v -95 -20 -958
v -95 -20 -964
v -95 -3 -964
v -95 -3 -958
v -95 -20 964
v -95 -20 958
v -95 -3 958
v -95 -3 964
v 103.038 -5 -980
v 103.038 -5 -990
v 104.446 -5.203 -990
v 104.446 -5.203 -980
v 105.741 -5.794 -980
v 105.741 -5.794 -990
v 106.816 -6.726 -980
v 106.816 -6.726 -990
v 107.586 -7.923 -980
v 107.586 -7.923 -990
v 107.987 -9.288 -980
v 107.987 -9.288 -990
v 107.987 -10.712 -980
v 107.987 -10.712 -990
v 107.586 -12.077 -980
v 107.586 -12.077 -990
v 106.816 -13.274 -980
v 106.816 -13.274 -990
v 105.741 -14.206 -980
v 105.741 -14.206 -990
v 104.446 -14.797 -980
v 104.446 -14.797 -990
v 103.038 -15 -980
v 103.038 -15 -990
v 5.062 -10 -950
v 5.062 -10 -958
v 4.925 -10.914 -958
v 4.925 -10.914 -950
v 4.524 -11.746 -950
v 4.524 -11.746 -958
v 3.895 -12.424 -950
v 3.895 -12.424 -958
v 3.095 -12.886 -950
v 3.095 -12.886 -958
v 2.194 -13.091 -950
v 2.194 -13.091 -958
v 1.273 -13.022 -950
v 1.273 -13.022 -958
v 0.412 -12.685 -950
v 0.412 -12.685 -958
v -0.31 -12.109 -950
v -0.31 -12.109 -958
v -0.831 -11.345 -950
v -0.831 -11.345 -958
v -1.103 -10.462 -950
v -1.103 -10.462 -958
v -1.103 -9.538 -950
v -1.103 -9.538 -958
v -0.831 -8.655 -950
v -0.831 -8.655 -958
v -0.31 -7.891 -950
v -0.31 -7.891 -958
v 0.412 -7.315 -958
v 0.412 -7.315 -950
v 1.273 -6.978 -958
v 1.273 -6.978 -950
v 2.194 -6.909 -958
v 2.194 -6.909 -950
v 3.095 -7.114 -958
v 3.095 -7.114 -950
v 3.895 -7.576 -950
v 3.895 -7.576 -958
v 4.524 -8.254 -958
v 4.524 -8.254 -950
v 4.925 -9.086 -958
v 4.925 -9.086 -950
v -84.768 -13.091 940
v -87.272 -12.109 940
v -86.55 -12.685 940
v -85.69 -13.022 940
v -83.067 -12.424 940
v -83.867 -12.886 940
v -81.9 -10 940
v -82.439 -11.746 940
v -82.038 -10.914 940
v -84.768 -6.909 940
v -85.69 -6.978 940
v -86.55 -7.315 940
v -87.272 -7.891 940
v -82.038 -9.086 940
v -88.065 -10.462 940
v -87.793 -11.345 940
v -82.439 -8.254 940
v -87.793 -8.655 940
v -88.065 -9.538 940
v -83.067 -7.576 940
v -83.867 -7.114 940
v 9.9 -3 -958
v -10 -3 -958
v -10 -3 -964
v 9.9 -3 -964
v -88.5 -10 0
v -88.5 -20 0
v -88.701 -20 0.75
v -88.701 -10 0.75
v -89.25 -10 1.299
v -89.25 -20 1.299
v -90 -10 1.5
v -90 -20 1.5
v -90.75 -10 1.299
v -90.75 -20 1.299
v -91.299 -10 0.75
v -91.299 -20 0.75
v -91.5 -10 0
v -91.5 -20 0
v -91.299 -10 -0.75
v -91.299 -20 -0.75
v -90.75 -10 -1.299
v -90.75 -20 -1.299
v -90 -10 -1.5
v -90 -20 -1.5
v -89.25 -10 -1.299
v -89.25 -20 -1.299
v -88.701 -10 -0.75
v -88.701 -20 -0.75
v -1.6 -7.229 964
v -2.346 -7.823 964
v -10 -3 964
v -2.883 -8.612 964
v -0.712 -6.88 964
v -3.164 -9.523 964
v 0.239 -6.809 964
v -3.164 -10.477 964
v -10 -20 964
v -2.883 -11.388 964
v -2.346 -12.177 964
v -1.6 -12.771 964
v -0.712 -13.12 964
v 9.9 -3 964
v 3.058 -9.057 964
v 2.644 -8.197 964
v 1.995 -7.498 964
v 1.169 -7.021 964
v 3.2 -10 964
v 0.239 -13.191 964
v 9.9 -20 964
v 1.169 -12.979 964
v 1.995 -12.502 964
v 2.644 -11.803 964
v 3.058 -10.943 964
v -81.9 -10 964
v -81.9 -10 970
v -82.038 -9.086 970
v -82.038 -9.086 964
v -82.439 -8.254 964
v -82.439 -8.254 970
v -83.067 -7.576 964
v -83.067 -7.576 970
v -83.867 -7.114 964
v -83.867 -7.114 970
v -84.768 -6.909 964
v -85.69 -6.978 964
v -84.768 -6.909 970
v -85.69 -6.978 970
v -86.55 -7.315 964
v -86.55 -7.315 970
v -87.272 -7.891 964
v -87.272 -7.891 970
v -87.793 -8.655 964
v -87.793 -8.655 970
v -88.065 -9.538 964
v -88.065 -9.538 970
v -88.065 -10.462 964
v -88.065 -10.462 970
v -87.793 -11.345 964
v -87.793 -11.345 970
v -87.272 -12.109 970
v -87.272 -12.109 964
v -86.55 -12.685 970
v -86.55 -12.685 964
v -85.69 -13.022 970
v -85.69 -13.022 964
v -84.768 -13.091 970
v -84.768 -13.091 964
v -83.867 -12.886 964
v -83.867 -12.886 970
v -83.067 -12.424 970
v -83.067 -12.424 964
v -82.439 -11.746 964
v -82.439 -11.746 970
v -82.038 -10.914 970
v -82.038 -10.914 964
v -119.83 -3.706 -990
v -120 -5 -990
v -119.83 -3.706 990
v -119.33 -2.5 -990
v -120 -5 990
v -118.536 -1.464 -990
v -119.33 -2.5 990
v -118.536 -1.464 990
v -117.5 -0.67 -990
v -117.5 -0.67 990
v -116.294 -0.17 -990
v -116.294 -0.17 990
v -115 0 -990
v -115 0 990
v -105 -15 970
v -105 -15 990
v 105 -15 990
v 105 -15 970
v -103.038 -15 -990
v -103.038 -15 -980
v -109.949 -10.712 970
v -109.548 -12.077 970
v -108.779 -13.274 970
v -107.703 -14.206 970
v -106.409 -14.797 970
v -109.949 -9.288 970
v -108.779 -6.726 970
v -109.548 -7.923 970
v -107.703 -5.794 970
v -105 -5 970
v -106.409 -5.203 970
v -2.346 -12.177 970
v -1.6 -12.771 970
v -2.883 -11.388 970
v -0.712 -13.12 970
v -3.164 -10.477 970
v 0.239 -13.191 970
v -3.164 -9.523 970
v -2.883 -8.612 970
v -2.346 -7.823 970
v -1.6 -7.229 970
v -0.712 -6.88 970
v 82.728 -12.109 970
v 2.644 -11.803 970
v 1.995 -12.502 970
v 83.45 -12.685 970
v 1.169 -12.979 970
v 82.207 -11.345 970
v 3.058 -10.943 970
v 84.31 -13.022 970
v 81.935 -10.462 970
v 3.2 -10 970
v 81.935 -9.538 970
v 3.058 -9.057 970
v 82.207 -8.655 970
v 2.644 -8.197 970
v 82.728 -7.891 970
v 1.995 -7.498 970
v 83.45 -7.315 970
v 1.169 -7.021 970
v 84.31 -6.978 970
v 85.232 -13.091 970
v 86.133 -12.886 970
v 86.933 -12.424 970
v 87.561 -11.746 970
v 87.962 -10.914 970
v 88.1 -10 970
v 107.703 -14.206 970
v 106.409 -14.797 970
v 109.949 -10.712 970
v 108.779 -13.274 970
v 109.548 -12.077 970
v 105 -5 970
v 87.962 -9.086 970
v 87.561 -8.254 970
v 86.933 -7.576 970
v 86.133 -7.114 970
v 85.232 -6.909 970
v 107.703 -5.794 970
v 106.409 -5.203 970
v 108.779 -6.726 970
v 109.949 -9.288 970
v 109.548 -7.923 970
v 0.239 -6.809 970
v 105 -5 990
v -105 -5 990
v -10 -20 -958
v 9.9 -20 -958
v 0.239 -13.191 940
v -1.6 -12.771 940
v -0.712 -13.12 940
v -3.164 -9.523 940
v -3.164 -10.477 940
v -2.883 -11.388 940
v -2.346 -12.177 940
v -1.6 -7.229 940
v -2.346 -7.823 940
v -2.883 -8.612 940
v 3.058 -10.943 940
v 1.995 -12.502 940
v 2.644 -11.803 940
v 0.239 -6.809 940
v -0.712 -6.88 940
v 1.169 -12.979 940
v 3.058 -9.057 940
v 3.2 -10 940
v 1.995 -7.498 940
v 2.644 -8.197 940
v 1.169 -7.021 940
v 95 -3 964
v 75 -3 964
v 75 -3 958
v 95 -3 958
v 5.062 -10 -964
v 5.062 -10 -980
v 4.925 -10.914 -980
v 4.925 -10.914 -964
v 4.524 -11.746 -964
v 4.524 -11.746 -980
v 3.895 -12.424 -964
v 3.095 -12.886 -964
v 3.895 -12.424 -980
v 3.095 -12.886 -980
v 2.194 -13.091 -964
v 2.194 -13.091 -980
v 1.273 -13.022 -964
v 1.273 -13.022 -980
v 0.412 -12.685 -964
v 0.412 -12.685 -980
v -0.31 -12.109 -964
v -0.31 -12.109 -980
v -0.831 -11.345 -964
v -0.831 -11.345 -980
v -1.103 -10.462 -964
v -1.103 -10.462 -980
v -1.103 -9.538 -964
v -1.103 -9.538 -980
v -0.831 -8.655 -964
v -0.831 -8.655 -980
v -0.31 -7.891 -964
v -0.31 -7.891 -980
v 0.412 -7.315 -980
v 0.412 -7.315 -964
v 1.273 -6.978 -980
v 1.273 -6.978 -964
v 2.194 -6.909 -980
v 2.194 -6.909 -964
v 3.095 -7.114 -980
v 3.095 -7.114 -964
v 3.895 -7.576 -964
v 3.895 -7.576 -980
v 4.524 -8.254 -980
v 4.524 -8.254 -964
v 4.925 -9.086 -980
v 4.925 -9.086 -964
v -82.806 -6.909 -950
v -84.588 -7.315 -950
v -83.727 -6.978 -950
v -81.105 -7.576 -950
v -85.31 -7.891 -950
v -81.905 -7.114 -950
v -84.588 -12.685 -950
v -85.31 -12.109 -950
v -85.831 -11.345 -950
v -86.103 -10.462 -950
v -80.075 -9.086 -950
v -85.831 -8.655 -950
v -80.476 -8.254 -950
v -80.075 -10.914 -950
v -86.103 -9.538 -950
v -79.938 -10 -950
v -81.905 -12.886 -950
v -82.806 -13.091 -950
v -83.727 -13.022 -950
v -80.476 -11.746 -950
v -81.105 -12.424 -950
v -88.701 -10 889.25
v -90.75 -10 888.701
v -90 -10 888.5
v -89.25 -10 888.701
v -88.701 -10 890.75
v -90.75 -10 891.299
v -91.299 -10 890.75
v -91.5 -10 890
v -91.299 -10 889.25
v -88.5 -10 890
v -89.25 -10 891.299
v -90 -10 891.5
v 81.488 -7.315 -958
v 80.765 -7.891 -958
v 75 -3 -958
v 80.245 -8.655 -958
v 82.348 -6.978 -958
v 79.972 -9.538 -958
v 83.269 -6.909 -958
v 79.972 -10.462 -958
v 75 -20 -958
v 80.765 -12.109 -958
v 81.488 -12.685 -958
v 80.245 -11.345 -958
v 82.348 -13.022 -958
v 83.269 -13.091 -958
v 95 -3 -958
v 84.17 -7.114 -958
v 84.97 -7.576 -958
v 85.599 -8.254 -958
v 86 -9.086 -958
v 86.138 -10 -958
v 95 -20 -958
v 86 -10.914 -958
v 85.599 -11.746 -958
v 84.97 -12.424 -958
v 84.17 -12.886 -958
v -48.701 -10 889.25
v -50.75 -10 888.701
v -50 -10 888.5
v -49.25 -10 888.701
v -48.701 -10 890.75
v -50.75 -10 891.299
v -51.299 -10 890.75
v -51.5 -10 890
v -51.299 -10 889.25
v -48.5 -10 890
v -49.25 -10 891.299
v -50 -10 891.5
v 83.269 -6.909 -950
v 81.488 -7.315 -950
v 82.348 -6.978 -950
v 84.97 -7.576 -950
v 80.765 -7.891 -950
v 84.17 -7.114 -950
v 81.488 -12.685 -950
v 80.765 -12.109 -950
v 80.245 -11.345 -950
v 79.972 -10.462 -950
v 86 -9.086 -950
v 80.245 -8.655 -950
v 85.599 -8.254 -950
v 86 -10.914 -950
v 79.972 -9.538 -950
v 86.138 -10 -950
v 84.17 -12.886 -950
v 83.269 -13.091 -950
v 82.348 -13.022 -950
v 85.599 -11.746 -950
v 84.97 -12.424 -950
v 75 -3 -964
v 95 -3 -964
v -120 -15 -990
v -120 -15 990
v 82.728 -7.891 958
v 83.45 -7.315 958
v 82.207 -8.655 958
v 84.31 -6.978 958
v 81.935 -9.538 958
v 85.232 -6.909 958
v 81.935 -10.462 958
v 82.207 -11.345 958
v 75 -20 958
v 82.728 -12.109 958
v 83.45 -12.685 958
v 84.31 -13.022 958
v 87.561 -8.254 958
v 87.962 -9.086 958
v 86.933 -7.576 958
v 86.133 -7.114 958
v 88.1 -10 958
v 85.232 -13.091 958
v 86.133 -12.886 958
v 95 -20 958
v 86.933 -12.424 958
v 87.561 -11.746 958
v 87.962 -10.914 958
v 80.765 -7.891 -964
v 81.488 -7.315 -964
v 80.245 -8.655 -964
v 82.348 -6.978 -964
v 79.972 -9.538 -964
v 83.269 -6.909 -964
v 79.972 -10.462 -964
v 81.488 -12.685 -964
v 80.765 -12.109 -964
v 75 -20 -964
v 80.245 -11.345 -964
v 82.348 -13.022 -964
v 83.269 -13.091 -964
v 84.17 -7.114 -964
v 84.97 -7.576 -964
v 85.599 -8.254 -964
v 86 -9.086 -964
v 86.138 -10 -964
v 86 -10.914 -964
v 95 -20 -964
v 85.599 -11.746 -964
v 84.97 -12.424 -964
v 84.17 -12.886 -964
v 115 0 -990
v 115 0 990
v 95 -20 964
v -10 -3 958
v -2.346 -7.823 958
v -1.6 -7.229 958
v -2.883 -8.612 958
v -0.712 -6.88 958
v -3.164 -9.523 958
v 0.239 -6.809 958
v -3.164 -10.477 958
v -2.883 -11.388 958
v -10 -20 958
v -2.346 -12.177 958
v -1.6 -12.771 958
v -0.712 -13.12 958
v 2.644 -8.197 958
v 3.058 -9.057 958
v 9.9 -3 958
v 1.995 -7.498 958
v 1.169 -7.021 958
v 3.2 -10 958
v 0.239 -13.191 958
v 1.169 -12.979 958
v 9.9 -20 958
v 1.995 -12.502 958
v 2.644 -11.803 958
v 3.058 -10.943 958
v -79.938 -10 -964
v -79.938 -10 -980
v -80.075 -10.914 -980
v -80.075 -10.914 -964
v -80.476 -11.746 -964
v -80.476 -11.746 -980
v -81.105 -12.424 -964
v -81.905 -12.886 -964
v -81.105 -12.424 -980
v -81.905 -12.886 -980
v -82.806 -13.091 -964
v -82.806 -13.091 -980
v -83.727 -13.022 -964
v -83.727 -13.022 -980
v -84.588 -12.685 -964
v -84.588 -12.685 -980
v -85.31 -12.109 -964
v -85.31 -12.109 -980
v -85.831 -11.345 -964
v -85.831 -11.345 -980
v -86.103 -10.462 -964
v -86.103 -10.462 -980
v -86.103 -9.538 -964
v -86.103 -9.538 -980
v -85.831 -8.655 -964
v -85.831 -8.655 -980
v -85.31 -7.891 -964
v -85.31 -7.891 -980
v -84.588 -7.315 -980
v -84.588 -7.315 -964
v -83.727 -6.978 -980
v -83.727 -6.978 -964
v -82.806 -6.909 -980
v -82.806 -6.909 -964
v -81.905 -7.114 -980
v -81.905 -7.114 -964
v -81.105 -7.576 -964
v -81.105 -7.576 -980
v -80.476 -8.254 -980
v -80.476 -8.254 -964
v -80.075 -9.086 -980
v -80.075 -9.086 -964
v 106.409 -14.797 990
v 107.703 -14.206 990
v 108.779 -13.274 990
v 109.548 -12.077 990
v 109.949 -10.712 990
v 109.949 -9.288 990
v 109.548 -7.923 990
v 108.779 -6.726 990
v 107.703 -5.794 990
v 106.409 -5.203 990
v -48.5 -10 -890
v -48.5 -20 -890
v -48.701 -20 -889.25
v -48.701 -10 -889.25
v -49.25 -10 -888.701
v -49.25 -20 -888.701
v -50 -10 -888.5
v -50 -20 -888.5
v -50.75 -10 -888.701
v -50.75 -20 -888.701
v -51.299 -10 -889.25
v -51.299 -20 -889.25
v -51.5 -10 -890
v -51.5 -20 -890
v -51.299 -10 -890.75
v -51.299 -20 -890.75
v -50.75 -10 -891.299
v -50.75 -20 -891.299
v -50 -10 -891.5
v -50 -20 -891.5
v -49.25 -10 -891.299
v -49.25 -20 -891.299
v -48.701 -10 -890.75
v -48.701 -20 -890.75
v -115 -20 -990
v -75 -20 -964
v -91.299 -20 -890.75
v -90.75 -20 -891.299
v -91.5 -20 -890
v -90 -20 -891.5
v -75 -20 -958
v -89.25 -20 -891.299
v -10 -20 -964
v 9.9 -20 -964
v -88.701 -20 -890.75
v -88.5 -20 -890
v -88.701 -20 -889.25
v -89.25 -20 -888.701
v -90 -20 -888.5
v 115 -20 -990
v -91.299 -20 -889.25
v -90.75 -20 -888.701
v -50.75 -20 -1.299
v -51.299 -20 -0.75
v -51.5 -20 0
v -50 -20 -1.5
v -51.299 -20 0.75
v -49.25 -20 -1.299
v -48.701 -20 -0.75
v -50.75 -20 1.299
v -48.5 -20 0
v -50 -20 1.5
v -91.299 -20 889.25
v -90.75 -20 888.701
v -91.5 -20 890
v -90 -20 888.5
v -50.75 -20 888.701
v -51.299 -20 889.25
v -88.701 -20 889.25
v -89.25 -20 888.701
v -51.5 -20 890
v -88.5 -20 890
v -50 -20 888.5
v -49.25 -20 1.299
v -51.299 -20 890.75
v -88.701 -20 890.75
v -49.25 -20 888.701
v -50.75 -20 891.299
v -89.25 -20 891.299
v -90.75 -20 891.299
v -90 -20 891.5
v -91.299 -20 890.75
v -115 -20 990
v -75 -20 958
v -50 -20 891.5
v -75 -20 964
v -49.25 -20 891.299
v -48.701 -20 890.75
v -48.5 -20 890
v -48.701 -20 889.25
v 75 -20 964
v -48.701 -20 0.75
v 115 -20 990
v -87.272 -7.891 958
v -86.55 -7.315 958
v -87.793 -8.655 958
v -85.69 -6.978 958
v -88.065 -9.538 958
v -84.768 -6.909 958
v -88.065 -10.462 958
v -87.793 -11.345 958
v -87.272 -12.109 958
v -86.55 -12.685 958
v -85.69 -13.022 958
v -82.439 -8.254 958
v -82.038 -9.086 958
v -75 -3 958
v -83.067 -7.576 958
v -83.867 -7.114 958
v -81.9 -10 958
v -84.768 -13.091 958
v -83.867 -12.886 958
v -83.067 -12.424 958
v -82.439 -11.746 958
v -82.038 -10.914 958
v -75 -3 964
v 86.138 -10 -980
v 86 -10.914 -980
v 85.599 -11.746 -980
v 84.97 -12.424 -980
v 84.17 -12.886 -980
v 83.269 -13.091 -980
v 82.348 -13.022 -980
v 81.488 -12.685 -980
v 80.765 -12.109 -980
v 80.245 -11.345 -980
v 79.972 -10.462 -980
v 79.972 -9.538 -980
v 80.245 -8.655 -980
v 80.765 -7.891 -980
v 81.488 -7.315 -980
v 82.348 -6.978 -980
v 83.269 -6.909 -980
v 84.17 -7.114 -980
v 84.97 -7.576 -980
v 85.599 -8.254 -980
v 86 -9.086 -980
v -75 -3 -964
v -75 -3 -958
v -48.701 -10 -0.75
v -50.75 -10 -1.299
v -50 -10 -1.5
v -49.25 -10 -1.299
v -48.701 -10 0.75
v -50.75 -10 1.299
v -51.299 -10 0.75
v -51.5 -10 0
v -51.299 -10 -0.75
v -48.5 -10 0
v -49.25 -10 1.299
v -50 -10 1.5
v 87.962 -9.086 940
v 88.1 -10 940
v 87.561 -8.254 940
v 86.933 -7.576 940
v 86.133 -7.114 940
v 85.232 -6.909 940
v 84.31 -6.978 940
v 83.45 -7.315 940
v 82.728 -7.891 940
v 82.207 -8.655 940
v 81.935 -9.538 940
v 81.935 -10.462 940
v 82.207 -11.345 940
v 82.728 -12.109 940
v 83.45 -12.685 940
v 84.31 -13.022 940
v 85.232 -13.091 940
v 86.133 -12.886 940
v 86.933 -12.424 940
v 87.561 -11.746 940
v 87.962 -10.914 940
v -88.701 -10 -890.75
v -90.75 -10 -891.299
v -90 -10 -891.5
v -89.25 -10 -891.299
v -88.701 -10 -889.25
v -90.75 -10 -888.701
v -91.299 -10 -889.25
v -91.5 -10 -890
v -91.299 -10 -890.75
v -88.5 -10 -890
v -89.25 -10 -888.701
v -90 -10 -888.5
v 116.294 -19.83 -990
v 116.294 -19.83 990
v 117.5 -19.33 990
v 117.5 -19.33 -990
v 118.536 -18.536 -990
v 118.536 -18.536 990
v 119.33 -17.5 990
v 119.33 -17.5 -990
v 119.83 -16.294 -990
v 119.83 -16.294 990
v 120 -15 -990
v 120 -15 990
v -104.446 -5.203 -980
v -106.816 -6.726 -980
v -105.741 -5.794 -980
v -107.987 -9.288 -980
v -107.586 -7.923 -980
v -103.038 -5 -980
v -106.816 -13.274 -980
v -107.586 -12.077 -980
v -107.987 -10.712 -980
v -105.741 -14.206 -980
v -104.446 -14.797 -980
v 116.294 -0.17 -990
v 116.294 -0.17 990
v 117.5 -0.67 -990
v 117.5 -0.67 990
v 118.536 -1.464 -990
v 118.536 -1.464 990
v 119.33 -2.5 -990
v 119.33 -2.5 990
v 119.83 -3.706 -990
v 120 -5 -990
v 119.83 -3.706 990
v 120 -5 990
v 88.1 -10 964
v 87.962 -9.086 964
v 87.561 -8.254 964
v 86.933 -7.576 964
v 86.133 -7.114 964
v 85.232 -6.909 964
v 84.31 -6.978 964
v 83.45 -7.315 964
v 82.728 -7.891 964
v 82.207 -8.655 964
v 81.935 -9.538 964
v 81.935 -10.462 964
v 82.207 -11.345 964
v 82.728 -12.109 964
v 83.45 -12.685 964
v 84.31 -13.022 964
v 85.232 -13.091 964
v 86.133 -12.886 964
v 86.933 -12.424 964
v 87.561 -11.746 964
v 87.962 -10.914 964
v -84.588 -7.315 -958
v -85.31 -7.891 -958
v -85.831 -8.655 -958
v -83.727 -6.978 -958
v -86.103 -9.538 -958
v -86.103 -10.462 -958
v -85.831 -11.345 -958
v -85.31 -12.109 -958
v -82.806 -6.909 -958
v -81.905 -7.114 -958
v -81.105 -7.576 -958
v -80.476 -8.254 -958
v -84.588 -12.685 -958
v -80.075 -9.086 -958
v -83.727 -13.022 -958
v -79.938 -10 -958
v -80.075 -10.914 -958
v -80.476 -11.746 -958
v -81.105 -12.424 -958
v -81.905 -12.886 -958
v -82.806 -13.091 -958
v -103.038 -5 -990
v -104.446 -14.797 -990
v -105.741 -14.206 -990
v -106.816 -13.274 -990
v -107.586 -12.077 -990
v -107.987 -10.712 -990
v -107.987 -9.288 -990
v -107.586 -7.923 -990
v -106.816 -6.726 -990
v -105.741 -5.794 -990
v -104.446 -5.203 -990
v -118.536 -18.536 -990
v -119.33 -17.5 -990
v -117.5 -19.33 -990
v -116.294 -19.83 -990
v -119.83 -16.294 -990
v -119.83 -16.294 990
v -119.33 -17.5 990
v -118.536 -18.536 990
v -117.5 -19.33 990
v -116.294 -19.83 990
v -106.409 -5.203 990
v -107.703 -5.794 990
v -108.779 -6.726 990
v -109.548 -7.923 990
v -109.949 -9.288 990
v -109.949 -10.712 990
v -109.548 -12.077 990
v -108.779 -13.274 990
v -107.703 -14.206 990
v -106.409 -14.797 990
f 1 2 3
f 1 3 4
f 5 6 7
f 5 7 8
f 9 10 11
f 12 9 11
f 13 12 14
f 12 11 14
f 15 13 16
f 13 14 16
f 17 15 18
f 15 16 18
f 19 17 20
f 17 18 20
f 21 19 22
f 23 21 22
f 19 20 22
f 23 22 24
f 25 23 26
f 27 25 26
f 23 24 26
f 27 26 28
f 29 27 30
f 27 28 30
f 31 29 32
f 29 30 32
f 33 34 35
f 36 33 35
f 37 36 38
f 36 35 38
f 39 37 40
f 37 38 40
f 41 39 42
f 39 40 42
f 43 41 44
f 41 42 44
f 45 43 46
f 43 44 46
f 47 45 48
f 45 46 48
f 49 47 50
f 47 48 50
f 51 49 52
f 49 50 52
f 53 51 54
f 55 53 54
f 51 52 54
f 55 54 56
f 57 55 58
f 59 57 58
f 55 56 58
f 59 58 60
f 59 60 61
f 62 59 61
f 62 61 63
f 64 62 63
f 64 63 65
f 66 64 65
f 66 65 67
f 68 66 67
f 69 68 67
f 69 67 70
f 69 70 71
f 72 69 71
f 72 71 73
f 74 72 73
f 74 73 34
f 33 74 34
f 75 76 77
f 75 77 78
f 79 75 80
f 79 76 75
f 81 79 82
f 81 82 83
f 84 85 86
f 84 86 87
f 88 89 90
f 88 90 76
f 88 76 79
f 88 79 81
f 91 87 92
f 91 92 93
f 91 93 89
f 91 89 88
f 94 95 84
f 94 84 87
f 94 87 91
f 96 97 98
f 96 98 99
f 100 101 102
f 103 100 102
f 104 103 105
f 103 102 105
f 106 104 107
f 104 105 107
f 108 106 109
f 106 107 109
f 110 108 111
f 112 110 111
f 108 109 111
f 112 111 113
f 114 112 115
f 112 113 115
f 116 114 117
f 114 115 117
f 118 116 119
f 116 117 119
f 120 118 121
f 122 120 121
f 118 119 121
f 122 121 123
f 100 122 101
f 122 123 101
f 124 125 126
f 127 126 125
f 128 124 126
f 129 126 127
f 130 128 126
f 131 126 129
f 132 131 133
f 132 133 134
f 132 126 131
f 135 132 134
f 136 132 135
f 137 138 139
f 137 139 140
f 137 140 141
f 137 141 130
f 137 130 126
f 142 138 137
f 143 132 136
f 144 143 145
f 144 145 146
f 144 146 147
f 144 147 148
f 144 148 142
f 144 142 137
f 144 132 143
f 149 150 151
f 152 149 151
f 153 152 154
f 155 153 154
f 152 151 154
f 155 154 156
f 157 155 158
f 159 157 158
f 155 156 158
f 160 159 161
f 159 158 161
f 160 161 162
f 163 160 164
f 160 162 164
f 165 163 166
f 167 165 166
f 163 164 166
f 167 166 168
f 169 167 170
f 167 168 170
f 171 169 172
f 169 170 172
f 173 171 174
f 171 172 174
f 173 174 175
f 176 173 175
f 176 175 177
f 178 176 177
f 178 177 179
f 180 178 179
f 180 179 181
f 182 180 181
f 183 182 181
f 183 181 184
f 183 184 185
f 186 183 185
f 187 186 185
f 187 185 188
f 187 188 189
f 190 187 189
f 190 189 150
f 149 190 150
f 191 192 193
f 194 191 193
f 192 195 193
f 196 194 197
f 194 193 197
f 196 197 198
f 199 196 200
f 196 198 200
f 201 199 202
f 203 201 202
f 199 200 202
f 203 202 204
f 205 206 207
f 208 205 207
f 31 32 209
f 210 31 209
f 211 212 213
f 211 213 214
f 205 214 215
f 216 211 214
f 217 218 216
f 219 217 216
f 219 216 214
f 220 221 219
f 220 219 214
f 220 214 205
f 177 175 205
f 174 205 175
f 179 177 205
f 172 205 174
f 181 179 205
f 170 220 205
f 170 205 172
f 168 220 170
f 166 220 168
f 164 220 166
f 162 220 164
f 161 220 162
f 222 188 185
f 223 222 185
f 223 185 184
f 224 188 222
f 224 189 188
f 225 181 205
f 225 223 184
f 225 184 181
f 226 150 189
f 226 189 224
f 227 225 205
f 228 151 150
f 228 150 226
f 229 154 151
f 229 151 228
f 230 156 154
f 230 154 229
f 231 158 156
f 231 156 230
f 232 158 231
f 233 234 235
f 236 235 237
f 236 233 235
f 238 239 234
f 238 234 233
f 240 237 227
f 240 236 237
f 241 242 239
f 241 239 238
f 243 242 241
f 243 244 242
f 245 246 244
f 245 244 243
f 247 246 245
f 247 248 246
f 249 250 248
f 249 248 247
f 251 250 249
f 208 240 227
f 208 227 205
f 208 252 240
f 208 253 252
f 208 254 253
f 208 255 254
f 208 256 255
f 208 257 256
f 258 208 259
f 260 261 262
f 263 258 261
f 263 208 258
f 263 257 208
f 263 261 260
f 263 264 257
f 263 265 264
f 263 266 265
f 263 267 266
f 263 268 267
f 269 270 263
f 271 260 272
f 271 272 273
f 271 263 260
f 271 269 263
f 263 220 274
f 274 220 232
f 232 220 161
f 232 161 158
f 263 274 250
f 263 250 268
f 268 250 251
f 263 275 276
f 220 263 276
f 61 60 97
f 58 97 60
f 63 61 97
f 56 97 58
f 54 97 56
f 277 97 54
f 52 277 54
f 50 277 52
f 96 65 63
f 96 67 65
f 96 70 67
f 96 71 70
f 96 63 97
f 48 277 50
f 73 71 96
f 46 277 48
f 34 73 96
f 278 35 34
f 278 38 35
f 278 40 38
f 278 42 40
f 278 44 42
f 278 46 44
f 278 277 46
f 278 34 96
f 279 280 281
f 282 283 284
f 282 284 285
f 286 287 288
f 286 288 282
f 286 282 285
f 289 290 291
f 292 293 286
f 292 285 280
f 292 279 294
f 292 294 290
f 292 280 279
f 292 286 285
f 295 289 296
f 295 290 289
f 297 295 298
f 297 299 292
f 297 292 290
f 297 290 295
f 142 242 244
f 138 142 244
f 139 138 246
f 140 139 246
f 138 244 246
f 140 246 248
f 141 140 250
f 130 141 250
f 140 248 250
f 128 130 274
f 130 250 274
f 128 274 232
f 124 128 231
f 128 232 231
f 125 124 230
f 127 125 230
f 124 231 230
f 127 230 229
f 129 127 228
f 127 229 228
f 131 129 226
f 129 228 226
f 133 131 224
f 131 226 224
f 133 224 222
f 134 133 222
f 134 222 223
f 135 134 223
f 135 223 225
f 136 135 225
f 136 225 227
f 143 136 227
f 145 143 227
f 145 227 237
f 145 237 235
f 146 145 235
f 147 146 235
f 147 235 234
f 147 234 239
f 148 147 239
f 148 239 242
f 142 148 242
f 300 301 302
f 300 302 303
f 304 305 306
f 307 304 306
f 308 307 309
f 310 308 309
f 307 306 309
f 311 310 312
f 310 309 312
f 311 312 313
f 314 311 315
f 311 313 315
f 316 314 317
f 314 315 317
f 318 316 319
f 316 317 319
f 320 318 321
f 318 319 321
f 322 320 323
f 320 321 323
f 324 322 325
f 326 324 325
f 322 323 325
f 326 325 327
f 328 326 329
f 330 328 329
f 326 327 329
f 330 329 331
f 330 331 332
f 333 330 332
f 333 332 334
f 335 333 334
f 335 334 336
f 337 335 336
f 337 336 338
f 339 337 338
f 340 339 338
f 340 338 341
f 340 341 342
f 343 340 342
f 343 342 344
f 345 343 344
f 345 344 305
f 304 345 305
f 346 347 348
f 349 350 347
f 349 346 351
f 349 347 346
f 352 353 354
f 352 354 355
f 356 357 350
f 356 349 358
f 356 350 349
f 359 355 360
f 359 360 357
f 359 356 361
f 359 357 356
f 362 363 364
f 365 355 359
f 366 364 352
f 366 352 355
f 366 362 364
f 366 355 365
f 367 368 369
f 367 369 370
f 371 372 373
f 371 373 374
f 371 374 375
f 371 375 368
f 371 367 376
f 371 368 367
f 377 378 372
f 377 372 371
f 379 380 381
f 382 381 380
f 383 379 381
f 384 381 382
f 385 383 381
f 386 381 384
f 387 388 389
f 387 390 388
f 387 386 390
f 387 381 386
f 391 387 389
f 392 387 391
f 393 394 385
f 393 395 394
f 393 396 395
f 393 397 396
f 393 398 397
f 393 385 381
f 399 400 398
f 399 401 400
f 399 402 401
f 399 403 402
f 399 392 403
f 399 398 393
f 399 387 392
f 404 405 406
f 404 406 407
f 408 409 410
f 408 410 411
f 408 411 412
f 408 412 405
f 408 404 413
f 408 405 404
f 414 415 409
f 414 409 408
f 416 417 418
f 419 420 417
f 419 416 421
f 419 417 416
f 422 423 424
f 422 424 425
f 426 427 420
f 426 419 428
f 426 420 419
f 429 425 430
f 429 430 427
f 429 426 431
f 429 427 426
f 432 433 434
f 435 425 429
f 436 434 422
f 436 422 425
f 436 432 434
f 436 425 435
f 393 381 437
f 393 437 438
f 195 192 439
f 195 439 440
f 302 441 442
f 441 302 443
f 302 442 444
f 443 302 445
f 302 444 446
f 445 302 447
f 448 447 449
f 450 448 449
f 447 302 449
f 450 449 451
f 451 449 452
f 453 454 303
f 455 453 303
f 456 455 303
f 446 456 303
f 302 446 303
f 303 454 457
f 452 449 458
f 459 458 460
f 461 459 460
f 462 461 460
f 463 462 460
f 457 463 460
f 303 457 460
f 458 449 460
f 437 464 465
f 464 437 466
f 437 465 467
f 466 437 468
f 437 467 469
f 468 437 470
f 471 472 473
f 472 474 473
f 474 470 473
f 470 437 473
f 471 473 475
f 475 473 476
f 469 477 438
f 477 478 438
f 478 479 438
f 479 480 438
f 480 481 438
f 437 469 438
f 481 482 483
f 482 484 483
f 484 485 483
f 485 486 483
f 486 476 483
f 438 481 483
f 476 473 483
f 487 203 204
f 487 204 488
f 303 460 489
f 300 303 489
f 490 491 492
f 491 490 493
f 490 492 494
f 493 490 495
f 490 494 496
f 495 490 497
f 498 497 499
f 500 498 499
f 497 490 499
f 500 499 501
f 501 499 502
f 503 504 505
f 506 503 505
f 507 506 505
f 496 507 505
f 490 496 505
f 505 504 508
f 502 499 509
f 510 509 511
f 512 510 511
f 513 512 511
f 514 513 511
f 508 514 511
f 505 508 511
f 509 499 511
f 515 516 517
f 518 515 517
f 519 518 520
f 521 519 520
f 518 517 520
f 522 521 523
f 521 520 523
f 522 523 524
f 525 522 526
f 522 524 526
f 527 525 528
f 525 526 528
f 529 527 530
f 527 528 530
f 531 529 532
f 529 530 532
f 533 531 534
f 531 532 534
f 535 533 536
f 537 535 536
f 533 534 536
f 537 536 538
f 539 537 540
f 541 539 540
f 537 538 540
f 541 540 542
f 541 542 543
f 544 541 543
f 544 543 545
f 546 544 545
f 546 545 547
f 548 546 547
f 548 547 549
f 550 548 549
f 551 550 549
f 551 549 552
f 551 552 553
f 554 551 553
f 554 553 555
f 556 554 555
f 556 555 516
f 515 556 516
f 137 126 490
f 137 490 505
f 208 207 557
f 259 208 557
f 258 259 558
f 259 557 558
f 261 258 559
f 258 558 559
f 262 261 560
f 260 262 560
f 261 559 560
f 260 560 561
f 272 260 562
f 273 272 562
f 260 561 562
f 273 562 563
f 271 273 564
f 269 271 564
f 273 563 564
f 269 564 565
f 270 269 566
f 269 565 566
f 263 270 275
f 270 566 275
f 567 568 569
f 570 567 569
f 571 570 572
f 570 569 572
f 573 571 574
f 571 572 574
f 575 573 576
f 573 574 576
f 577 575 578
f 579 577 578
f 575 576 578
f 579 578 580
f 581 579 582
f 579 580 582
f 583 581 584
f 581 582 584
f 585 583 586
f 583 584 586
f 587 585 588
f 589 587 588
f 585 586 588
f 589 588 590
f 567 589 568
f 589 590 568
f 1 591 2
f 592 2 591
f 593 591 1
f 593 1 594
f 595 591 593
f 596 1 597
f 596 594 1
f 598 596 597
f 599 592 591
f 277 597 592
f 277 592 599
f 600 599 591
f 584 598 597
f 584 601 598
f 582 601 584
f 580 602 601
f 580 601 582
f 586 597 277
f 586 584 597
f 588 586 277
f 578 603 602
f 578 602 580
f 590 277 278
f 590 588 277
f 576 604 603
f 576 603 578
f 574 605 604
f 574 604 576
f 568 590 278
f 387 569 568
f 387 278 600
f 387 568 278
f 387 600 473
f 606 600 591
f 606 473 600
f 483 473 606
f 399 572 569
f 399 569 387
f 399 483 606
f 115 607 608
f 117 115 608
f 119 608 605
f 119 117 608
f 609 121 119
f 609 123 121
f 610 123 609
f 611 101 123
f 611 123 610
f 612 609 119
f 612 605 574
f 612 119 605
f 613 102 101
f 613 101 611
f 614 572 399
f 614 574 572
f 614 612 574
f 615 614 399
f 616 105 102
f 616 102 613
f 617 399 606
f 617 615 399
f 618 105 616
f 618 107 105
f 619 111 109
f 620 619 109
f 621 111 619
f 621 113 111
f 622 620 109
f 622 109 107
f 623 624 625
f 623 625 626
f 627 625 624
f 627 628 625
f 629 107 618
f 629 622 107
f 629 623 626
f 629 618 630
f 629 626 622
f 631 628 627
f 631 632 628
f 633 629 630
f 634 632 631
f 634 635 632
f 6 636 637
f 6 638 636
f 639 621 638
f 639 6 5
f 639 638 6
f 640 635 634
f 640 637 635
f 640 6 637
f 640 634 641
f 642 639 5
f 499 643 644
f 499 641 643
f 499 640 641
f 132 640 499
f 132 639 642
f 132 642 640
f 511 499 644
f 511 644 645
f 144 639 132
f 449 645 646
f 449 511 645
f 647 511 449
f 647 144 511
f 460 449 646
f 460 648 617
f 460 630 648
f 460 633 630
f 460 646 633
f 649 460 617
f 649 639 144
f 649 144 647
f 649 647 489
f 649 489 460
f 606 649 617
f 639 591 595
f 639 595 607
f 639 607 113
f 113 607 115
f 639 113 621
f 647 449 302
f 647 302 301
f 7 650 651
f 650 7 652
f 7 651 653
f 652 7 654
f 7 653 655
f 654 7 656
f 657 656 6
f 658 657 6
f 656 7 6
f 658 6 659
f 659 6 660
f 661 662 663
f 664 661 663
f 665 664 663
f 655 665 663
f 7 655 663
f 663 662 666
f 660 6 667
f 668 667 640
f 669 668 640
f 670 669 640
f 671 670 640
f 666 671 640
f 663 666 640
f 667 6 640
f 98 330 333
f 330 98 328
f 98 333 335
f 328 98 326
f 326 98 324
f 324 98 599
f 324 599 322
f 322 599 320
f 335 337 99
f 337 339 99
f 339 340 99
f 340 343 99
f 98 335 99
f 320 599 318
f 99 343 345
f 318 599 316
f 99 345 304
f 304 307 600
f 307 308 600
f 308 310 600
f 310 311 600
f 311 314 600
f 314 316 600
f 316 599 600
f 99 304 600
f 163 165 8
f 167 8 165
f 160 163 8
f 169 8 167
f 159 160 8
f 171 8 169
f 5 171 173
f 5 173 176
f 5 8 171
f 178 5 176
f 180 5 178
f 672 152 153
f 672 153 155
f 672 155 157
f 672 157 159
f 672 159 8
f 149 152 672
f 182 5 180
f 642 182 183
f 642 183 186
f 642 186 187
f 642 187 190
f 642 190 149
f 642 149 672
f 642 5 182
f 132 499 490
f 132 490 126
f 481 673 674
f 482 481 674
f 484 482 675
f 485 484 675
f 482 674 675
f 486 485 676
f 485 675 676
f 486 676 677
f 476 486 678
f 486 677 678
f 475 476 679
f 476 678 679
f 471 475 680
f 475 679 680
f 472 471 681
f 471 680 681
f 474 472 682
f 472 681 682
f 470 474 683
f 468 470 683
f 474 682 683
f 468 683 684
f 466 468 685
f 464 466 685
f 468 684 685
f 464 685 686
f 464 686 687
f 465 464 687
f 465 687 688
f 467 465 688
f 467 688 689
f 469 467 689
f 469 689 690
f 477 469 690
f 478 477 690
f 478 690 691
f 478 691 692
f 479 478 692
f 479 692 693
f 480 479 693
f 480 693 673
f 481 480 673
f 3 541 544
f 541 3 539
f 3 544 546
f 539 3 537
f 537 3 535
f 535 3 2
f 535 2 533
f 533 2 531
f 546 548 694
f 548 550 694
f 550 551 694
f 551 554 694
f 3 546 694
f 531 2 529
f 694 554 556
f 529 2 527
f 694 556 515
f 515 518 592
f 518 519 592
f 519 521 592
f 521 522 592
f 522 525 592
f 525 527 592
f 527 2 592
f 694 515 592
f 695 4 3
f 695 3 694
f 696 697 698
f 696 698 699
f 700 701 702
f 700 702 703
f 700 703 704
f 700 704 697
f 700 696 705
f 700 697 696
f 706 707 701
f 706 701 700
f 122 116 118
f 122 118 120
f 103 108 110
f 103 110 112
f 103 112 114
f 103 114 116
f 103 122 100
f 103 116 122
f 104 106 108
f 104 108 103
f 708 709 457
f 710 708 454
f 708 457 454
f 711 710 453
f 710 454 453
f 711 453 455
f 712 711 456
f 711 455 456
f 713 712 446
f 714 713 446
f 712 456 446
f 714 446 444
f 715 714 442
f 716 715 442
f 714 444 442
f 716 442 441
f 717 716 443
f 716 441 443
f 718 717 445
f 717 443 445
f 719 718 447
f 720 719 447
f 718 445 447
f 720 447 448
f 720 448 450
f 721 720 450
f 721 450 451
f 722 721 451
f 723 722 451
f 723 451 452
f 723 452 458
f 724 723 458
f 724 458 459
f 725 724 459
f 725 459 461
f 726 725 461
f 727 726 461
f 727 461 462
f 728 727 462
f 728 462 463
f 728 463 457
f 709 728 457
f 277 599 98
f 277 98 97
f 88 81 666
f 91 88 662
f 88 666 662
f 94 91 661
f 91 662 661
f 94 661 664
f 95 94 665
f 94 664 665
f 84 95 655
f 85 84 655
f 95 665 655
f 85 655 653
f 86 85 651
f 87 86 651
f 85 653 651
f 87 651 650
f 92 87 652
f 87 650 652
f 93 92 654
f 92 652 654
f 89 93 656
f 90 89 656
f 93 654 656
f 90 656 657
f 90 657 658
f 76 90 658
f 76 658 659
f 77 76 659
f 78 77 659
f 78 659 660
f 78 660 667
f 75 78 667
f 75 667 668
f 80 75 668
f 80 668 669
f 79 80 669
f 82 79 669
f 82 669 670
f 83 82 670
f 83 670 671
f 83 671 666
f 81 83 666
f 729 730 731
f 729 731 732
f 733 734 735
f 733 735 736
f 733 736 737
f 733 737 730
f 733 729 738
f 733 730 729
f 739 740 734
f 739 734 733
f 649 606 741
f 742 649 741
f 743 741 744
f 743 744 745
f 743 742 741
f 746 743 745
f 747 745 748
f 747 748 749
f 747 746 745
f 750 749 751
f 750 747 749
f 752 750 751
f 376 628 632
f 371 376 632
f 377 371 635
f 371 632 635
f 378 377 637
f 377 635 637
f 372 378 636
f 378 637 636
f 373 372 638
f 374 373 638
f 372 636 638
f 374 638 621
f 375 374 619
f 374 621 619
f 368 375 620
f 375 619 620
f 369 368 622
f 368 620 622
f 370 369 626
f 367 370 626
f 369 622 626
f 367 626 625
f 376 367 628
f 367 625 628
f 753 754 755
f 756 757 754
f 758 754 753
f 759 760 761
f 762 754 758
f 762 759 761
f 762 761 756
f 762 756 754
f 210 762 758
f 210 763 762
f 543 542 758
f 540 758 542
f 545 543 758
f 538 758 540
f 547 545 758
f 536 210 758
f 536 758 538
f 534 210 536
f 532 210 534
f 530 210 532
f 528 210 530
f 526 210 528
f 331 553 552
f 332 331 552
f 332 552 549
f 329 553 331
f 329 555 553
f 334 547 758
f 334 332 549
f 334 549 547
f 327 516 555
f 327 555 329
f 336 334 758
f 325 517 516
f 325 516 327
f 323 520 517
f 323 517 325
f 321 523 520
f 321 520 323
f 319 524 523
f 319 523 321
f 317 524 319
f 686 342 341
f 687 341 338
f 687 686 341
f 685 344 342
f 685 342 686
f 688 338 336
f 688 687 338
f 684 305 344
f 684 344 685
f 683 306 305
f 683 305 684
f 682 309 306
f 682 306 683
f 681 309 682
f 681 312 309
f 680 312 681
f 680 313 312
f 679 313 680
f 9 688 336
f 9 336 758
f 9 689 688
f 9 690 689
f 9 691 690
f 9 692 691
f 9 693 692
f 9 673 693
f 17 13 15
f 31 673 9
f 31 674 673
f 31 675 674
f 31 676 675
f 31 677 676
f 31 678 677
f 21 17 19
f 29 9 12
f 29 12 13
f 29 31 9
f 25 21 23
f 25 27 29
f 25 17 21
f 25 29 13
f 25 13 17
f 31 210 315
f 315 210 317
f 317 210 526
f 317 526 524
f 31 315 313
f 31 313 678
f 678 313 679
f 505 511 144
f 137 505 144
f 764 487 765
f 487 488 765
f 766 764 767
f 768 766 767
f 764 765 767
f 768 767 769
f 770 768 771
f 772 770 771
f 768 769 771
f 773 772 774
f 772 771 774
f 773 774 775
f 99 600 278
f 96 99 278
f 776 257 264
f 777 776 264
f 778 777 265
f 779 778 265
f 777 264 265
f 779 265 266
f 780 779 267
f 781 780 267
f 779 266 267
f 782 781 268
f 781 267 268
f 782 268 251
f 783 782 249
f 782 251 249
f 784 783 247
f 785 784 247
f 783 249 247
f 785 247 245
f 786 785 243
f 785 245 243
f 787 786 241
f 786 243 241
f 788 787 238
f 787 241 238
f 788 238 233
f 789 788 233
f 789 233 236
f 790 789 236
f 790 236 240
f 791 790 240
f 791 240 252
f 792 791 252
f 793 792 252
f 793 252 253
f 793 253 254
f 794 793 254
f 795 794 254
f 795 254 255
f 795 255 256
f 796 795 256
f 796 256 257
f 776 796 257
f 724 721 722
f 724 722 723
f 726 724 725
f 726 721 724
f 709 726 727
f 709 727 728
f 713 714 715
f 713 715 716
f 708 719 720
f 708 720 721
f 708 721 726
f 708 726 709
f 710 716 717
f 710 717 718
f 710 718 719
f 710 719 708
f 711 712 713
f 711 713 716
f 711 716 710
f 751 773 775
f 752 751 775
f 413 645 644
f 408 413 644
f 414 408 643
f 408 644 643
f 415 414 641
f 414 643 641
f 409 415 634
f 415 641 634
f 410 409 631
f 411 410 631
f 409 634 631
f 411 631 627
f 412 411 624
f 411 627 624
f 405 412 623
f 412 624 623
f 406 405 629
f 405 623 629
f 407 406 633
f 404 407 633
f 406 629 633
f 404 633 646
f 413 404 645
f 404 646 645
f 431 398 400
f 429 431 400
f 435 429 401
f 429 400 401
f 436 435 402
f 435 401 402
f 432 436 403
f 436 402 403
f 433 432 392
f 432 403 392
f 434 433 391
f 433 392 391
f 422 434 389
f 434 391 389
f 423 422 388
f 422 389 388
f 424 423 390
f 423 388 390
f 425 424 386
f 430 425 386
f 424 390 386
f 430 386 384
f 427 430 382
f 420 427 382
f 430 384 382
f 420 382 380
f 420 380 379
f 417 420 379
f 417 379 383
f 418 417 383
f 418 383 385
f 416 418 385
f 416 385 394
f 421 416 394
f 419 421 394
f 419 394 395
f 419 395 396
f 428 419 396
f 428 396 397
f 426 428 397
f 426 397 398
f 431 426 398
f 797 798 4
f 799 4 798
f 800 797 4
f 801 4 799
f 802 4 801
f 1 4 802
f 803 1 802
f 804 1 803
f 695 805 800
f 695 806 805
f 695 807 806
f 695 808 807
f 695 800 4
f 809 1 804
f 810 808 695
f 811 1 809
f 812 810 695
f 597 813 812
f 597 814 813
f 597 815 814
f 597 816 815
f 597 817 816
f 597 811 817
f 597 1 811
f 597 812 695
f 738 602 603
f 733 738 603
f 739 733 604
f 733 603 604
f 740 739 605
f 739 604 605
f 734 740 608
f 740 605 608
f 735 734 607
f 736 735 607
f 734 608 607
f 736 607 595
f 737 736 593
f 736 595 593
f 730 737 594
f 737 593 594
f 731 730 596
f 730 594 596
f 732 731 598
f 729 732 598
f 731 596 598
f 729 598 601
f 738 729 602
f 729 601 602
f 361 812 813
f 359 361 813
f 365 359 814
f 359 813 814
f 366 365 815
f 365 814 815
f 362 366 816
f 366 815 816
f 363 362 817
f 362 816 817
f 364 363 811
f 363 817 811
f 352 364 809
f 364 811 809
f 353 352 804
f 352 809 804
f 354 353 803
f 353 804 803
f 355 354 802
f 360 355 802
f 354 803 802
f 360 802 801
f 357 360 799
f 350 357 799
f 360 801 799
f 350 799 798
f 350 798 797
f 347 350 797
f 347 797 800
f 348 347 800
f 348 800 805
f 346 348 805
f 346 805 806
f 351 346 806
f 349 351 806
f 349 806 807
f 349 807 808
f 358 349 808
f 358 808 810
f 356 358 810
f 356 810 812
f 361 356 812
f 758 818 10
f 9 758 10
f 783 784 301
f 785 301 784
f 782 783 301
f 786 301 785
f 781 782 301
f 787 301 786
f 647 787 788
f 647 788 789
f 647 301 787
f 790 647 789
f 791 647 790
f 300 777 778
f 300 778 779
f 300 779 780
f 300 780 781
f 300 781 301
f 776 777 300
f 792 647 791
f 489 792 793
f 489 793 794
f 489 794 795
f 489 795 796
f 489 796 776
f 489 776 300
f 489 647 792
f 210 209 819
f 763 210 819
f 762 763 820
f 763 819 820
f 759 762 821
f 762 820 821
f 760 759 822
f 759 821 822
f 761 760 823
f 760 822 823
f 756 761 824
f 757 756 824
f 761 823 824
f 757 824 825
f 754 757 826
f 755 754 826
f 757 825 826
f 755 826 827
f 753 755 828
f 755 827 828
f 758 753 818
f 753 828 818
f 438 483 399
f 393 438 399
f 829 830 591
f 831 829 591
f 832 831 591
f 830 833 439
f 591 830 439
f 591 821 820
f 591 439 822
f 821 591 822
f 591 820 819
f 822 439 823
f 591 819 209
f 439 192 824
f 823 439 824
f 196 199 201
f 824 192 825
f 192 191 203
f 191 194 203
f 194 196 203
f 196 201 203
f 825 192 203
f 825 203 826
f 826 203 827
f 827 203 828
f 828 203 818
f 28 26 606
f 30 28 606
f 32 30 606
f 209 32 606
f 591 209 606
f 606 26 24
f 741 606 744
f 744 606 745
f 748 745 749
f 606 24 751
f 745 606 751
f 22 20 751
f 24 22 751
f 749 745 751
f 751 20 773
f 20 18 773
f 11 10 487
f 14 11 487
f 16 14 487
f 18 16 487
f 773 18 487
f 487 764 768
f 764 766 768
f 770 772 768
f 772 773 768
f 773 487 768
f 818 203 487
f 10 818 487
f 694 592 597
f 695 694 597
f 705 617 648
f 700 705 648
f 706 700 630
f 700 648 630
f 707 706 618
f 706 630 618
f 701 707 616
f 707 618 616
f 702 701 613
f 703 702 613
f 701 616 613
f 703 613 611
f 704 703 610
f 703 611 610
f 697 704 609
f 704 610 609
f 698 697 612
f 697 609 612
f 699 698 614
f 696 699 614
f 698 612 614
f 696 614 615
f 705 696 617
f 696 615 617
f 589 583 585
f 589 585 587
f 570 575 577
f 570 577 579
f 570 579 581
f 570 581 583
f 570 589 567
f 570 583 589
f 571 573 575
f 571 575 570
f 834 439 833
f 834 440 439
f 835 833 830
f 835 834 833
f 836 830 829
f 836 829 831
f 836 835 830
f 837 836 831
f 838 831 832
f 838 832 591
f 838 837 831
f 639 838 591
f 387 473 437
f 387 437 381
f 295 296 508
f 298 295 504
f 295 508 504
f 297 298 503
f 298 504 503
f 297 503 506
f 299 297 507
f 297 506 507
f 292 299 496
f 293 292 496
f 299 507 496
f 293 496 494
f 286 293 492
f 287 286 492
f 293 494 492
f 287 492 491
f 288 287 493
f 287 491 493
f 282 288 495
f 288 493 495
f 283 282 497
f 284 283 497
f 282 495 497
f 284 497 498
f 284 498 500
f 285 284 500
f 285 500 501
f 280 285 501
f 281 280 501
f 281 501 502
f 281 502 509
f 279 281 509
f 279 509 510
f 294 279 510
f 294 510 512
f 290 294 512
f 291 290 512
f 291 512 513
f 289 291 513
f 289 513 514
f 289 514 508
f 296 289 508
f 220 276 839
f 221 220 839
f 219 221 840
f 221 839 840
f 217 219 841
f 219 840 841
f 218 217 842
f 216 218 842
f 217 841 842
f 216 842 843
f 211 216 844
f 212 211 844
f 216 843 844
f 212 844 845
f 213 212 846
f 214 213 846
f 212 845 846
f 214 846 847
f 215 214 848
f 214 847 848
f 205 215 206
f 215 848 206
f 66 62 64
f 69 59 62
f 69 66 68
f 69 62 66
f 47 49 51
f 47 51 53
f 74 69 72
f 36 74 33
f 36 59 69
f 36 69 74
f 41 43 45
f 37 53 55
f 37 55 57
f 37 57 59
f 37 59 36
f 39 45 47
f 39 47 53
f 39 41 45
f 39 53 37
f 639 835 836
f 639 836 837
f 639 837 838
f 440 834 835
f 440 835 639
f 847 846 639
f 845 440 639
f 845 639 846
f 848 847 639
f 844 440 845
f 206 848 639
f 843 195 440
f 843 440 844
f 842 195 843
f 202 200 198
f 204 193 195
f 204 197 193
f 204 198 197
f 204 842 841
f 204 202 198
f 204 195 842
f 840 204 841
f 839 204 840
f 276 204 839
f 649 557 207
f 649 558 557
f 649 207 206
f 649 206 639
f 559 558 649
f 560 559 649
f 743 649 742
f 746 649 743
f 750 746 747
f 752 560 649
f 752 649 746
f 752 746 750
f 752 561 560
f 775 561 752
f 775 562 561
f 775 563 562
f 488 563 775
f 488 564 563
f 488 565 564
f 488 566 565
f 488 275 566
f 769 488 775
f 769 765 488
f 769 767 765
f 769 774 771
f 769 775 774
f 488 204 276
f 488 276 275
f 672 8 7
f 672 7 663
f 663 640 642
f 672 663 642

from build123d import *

# Parameters (mm, degrees)
F0_W      = 240
F0_H      = 1980
F1_DEPTH  = 20
F2_R      = 1.5
F3_DEPTH  = 10
F5_DEPTH  = 20
F7_DEPTH  = 10
F8_R      = 5
F9_R      = 3.1
F9_R_2    = 3.2
F10_DEPTH = 30
F11_R     = 3.1
F12_DEPTH = 30
F13_W     = 20
F13_H     = 6
F13_W_2   = 19.9
F14_DEPTH = 17


with BuildPart() as f1:
    # F0 (on Front) → F1 (new body)
    with BuildSketch(Plane.XZ):
        Rectangle(F0_W, F0_H)
    extrude(amount=F1_DEPTH)

    # F2 (on face) → F3 (cut)
    with BuildSketch(Plane.XZ.offset(20)):
        with Locations((-50, 890)):
            Circle(F2_R)
        with Locations((-90, 890)):
            Circle(F2_R)
        with Locations((-90, 0)):
            Circle(F2_R)
        with Locations((-50, 0)):
            Circle(F2_R)
        with Locations((-50, -890)):
            Circle(F2_R)
        with Locations((-90, -890)):
            Circle(F2_R)
    extrude(amount=-F3_DEPTH, mode=Mode.SUBTRACT)

    # F4 (on face) → F5 (cut)
    with BuildSketch(Plane.XY.offset(990)):
        with BuildLine():
            Line((105, -5), (-105, -5))
            ThreePointArc((-105, -5), (-110, -10), (-105, -15))
            Line((-105, -15), (105, -15))
            ThreePointArc((105, -15), (110, -10), (105, -5))
        make_face()
    extrude(amount=-F5_DEPTH, mode=Mode.SUBTRACT)

    # F6 (on face) → F7 (cut)
    with BuildSketch(Plane(origin=(0, 0, -990), x_dir=(1, 0, 0), z_dir=(0, 0, -1))):
        with BuildLine():
            Line((-103.037506, 5), (103.037506, 5))
            ThreePointArc((103.037506, 5), (108.037506, 10), (103.037506, 15))
            Line((103.037506, 15), (-103.037506, 15))
            ThreePointArc((-103.037506, 15), (-108.037506, 10), (-103.037506, 5))
        make_face()
    extrude(amount=-F7_DEPTH, mode=Mode.SUBTRACT)

    # F8
    f8_edges = [f1.edges().sort_by_distance(p)[0] for p in [
        (120, 0, 0),
        (120, -20, 0),
        (-120, -20, 0),
        (-120, 0, 0),
    ]]
    fillet(f8_edges, radius=F8_R)

    # F9 (on face) → F10 (cut)
    with BuildSketch(Plane.XY.offset(970)):
        with Locations((85, -10)):
            Circle(F9_R)
        with Locations((0, -10)):
            Circle(F9_R_2)
        with Locations((-85, -10)):
            Circle(F9_R)
    extrude(amount=-F10_DEPTH, mode=Mode.SUBTRACT)

    # F11 (on face) → F12 (cut)
    with BuildSketch(Plane(origin=(0, 0, -980), x_dir=(1, 0, 0), z_dir=(0, 0, -1))):
        with Locations((83.037506, 10)):
            Circle(F11_R)
        with Locations((1.962494, 10)):
            Circle(F11_R)
        with Locations((-83.037506, 10)):
            Circle(F11_R)
    extrude(amount=-F12_DEPTH, mode=Mode.SUBTRACT)

    # F13 (on face) → F14 (cut)
    with BuildSketch(Plane.XZ.offset(20)):
        with Locations((85, 961)):
            Rectangle(F13_W, F13_H)
        with Locations((-0.05, 961)):
            Rectangle(F13_W_2, F13_H)
        with Locations((-85, 961)):
            Rectangle(F13_W, F13_H)
        with Locations((-85, -961)):
            Rectangle(F13_W, F13_H)
        with Locations((-0.05, -961)):
            Rectangle(F13_W_2, F13_H)
        with Locations((85, -961)):
            Rectangle(F13_W, F13_H)
    extrude(amount=-F14_DEPTH, mode=Mode.SUBTRACT)


solid = f1.part
